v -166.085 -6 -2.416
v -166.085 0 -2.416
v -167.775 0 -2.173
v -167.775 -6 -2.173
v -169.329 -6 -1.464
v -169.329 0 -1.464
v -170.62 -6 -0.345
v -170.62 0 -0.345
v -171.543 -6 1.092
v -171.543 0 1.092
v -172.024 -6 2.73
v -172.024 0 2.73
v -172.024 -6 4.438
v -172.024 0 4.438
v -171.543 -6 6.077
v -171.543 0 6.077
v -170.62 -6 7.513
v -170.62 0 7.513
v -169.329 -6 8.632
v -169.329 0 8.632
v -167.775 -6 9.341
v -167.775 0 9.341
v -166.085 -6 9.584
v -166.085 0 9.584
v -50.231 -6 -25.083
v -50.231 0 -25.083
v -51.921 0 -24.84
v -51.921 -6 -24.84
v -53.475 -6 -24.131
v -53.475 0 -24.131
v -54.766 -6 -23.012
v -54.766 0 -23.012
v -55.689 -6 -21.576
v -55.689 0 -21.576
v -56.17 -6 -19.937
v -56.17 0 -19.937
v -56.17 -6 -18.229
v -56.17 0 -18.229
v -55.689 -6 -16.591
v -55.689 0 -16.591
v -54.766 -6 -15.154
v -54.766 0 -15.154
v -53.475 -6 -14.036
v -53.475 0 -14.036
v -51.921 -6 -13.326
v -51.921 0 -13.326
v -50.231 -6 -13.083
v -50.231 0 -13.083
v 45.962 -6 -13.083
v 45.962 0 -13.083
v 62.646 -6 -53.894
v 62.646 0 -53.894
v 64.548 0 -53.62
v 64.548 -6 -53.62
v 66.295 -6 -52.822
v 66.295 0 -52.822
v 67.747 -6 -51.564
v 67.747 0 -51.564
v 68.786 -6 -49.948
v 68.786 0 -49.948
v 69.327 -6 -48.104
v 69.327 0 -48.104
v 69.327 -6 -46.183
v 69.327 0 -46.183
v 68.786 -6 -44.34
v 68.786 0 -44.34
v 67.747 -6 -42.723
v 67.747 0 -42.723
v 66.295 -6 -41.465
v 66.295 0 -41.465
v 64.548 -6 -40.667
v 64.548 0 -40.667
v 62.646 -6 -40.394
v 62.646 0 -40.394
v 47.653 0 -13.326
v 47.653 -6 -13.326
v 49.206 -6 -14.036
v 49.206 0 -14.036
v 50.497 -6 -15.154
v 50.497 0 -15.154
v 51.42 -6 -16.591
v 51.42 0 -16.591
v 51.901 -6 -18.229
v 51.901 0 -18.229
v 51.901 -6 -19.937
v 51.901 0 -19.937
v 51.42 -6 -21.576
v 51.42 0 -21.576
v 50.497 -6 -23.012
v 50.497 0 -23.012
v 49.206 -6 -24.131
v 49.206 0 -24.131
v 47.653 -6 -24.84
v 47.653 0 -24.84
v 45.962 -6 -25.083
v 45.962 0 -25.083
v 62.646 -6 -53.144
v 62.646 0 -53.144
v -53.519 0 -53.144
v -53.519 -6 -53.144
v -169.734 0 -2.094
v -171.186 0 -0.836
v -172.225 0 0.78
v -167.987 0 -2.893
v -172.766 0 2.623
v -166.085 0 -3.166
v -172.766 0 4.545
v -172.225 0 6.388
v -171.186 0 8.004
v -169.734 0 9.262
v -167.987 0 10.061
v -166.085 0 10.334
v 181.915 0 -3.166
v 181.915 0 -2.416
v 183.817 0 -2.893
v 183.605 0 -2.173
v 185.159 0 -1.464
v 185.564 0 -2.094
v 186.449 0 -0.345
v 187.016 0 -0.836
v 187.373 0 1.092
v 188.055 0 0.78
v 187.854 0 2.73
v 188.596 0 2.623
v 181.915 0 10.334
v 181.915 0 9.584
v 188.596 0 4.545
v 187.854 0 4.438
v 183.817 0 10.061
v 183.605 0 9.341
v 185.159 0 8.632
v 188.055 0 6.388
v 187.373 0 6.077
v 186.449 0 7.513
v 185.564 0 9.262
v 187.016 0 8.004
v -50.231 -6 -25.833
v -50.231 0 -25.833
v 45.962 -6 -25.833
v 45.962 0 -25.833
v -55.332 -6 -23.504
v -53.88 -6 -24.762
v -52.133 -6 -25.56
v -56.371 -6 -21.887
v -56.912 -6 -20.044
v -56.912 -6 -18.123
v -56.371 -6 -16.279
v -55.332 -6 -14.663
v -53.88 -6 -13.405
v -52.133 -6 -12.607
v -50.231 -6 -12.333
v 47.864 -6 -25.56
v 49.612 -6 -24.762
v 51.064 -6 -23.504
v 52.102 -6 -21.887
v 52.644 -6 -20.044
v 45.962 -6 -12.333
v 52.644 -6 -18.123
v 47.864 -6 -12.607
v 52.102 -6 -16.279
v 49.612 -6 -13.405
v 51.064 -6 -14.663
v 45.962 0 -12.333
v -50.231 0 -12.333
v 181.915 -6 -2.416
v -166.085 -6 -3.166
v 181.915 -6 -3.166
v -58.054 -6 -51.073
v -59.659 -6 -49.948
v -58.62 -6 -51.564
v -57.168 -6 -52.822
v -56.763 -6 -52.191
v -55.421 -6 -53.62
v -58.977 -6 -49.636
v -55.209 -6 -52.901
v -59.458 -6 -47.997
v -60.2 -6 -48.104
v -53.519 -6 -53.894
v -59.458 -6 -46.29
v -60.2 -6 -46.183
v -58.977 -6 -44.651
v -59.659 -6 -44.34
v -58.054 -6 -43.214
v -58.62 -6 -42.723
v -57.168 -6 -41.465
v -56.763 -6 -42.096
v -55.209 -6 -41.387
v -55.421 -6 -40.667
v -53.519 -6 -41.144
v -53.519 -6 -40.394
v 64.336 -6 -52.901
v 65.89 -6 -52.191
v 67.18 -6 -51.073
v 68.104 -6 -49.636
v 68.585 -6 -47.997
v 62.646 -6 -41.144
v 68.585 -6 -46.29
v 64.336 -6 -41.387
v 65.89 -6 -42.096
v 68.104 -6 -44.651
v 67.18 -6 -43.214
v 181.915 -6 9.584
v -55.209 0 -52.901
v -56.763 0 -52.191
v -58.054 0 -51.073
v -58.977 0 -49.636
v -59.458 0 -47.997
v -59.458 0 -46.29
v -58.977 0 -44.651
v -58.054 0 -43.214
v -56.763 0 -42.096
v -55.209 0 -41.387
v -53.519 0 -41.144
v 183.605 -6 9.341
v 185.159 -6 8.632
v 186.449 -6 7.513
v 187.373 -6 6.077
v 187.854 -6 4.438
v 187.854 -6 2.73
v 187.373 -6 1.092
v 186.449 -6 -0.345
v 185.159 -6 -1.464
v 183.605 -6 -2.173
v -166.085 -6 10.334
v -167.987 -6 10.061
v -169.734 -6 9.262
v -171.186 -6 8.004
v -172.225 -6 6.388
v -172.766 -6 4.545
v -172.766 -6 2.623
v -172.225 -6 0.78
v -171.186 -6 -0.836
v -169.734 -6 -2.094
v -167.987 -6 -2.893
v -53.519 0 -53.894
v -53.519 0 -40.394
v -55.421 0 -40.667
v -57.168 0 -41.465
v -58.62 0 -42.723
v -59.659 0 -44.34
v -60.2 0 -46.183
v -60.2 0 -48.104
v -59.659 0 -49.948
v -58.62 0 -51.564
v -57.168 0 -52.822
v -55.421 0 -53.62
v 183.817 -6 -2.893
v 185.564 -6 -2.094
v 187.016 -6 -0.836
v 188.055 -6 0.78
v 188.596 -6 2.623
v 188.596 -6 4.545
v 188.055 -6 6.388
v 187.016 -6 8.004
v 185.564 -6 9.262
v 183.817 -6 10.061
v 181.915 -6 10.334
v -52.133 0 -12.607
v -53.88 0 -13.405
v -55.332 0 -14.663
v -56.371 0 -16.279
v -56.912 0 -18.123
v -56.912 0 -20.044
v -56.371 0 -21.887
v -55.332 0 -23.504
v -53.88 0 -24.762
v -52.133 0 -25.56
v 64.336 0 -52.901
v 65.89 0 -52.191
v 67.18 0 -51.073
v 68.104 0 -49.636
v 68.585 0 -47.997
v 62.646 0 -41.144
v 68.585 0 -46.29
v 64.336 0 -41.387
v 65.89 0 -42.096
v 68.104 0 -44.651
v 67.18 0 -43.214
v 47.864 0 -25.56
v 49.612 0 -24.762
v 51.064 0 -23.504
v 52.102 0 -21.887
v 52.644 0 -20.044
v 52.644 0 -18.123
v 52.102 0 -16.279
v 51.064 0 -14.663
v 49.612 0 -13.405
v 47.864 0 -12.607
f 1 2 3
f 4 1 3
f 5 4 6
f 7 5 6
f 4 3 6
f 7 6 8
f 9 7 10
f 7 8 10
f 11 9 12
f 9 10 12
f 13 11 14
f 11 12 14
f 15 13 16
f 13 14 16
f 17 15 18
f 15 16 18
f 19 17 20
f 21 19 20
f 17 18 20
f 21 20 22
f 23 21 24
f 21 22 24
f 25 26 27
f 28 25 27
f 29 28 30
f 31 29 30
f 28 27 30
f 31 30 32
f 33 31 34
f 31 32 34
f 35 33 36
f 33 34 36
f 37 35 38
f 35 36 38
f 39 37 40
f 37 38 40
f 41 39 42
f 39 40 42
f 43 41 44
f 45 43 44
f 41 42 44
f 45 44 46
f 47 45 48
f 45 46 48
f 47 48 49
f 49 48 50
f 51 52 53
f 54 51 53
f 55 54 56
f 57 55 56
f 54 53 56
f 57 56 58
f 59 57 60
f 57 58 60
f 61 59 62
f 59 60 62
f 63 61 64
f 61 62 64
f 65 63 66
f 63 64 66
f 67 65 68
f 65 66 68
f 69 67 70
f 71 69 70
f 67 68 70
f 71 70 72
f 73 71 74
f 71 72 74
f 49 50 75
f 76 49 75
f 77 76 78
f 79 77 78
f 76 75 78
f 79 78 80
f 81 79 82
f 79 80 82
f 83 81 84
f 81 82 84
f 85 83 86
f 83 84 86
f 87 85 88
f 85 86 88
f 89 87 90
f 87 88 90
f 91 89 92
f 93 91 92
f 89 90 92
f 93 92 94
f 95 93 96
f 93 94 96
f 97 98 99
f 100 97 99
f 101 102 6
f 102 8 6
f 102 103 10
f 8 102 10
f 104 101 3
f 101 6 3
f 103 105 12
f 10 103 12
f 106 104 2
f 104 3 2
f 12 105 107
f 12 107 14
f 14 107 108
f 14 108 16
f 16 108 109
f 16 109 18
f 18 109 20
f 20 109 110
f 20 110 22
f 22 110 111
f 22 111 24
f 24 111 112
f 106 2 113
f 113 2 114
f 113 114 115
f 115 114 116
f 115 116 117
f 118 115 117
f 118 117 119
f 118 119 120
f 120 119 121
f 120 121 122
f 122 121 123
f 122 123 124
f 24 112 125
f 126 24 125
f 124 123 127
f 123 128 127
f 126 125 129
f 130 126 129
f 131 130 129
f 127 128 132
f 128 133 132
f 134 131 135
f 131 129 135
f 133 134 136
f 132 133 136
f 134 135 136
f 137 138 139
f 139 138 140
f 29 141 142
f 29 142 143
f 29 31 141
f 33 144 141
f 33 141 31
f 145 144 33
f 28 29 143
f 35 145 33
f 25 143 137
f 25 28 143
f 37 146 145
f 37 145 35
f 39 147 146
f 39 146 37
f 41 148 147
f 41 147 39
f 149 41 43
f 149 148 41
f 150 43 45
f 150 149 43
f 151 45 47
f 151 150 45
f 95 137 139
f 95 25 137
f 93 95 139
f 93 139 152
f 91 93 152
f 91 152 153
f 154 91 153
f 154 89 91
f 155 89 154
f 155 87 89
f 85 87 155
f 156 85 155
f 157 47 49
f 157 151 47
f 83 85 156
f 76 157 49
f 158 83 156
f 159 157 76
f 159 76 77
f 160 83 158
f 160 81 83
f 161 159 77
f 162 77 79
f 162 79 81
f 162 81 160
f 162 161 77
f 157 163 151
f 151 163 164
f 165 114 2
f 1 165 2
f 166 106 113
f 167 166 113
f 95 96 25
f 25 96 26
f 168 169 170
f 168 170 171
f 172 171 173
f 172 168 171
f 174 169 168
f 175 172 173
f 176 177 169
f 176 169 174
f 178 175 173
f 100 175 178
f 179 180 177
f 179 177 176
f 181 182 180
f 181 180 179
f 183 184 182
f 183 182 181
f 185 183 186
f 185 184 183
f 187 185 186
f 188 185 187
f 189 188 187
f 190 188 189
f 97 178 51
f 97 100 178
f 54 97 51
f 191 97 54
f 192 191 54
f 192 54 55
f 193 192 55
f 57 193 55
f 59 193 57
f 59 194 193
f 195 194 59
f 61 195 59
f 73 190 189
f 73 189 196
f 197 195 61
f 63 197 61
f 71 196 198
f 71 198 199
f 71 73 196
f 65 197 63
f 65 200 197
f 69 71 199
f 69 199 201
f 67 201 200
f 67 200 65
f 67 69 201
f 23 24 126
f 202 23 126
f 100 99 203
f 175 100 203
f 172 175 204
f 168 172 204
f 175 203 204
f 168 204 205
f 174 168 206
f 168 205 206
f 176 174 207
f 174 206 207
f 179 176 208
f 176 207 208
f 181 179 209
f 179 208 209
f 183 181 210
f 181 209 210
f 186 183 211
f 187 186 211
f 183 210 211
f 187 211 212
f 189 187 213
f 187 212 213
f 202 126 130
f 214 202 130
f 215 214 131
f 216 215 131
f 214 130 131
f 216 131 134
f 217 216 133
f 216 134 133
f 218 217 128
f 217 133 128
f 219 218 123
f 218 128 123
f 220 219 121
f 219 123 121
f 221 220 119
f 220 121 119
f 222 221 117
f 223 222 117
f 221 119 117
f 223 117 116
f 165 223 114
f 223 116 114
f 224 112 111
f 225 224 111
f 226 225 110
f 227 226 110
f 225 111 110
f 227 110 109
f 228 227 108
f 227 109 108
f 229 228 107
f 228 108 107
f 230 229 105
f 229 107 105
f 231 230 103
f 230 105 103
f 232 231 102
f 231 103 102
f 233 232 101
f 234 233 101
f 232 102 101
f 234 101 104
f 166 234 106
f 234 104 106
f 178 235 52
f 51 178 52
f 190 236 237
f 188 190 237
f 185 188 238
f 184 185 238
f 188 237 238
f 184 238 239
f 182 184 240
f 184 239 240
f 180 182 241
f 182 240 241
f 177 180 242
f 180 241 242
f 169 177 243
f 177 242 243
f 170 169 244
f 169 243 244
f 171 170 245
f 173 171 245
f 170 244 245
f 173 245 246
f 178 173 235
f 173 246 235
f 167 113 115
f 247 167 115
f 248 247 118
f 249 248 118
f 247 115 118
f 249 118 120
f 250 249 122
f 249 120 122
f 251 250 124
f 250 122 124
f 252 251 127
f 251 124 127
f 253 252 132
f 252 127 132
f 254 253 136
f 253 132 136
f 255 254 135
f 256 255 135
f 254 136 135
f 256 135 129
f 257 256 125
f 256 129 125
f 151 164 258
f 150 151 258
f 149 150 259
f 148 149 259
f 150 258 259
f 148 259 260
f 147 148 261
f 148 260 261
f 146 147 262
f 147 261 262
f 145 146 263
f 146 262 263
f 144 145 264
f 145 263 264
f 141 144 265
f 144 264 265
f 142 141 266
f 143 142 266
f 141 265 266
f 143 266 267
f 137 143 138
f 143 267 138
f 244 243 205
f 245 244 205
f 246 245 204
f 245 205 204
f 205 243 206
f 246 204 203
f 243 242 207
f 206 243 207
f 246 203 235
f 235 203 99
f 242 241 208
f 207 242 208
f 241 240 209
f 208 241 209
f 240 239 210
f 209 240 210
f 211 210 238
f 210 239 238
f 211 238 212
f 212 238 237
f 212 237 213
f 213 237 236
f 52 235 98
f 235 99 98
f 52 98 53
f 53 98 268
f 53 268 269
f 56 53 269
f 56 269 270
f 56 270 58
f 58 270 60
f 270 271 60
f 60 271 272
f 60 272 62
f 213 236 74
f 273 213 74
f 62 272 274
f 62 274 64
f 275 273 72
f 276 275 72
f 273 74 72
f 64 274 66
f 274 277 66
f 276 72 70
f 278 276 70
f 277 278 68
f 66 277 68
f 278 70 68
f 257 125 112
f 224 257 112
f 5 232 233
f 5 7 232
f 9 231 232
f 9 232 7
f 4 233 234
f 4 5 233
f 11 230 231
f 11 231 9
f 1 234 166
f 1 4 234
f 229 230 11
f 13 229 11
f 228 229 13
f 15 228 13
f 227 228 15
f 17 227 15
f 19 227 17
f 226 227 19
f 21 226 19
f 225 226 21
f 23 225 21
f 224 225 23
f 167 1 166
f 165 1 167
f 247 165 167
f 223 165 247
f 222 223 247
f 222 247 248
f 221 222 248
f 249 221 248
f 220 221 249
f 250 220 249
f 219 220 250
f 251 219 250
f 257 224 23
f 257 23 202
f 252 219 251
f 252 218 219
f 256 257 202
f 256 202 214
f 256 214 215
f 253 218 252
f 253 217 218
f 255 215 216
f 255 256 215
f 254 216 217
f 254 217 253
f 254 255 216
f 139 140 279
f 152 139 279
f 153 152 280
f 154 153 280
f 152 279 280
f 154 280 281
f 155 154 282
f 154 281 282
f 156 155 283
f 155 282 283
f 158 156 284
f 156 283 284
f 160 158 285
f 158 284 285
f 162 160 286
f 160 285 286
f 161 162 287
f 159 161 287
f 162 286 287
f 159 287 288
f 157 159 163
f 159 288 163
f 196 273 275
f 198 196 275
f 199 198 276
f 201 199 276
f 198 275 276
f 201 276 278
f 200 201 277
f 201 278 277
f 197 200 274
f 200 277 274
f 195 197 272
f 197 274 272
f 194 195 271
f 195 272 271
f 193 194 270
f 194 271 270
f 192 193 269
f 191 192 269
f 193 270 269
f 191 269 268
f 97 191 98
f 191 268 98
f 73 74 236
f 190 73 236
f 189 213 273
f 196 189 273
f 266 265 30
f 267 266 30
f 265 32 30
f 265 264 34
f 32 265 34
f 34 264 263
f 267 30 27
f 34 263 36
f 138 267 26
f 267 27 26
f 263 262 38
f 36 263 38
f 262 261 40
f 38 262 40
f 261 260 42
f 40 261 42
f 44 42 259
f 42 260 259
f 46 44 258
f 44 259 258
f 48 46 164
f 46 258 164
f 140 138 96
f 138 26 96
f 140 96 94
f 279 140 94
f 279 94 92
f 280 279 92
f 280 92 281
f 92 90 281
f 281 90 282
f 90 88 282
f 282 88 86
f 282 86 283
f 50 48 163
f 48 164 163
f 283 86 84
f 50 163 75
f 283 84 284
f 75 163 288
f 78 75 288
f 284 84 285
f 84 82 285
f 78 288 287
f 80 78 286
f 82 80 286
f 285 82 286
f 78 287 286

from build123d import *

# Parameters (mm, degrees)
F1_DEPTH = 6
F3_DEPTH = 6
F5_DEPTH = 6


with BuildPart() as f1:
    # F0 (on Front) → F1 (new body)
    with BuildSketch(Plane.XZ):
        with BuildLine():
            Line((181.914975, 10.334014), (-166.085025, 10.334014))
            ThreePointArc((-166.085025, 10.334014), (-172.835025, 3.584014), (-166.085025, -3.165986))
            Line((-166.085025, -3.165986), (181.914975, -3.165986))
            ThreePointArc((181.914975, -3.165986), (188.664975, 3.584014), (181.914975, 10.334014))
        make_face()
        with BuildLine():
            ThreePointArc((-166.085025, -2.415986), (-172.085025, 3.584014), (-166.085025, 9.584014))
            Line((-166.085025, 9.584014), (181.914975, 9.584014))
            ThreePointArc((181.914975, 9.584014), (187.914975, 3.584014), (181.914975, -2.415986))
            Line((181.914975, -2.415986), (-166.085025, -2.415986))
        make_face(mode=Mode.SUBTRACT)
    extrude(amount=F1_DEPTH)


with BuildPart() as f3:
    # F2 (on Front) → F3 (new body)
    with BuildSketch(Plane.XZ):
        with BuildLine():
            Line((45.962312, -12.33333), (-50.231058, -12.33333))
            ThreePointArc((-50.231058, -12.33333), (-56.981058, -19.08333), (-50.231058, -25.83333))
            Line((-50.231058, -25.83333), (45.962312, -25.83333))
            ThreePointArc((45.962312, -25.83333), (52.712312, -19.08333), (45.962312, -12.33333))
        make_face()
        with BuildLine():
            ThreePointArc((-50.231058, -25.08333), (-56.231058, -19.08333), (-50.231058, -13.08333))
            Line((-50.231058, -13.08333), (45.962312, -13.08333))
            ThreePointArc((45.962312, -13.08333), (51.962312, -19.08333), (45.962312, -25.08333))
            Line((45.962312, -25.08333), (-50.231058, -25.08333))
        make_face(mode=Mode.SUBTRACT)
    extrude(amount=F3_DEPTH)


with BuildPart() as f5:
    # F4 (on Front) → F5 (new body)
    with BuildSketch(Plane.XZ):
        with BuildLine():
            Line((62.6459, -40.393552), (-53.5191, -40.393552))
            ThreePointArc((-53.5191, -40.393552), (-60.2691, -47.143552), (-53.5191, -53.893552))
            Line((-53.5191, -53.893552), (62.6459, -53.893552))
            ThreePointArc((62.6459, -53.893552), (69.3959, -47.143552), (62.6459, -40.393552))
        make_face()
        with BuildLine():
            ThreePointArc((-53.5191, -53.143552), (-59.5191, -47.143552), (-53.5191, -41.143552))
            Line((-53.5191, -41.143552), (62.6459, -41.143552))
            ThreePointArc((62.6459, -41.143552), (68.6459, -47.143552), (62.6459, -53.143552))
            Line((62.6459, -53.143552), (-53.5191, -53.143552))
        make_face(mode=Mode.SUBTRACT)
    extrude(amount=F5_DEPTH)


solid = Compound([f1.part, f3.part, f5.part])
